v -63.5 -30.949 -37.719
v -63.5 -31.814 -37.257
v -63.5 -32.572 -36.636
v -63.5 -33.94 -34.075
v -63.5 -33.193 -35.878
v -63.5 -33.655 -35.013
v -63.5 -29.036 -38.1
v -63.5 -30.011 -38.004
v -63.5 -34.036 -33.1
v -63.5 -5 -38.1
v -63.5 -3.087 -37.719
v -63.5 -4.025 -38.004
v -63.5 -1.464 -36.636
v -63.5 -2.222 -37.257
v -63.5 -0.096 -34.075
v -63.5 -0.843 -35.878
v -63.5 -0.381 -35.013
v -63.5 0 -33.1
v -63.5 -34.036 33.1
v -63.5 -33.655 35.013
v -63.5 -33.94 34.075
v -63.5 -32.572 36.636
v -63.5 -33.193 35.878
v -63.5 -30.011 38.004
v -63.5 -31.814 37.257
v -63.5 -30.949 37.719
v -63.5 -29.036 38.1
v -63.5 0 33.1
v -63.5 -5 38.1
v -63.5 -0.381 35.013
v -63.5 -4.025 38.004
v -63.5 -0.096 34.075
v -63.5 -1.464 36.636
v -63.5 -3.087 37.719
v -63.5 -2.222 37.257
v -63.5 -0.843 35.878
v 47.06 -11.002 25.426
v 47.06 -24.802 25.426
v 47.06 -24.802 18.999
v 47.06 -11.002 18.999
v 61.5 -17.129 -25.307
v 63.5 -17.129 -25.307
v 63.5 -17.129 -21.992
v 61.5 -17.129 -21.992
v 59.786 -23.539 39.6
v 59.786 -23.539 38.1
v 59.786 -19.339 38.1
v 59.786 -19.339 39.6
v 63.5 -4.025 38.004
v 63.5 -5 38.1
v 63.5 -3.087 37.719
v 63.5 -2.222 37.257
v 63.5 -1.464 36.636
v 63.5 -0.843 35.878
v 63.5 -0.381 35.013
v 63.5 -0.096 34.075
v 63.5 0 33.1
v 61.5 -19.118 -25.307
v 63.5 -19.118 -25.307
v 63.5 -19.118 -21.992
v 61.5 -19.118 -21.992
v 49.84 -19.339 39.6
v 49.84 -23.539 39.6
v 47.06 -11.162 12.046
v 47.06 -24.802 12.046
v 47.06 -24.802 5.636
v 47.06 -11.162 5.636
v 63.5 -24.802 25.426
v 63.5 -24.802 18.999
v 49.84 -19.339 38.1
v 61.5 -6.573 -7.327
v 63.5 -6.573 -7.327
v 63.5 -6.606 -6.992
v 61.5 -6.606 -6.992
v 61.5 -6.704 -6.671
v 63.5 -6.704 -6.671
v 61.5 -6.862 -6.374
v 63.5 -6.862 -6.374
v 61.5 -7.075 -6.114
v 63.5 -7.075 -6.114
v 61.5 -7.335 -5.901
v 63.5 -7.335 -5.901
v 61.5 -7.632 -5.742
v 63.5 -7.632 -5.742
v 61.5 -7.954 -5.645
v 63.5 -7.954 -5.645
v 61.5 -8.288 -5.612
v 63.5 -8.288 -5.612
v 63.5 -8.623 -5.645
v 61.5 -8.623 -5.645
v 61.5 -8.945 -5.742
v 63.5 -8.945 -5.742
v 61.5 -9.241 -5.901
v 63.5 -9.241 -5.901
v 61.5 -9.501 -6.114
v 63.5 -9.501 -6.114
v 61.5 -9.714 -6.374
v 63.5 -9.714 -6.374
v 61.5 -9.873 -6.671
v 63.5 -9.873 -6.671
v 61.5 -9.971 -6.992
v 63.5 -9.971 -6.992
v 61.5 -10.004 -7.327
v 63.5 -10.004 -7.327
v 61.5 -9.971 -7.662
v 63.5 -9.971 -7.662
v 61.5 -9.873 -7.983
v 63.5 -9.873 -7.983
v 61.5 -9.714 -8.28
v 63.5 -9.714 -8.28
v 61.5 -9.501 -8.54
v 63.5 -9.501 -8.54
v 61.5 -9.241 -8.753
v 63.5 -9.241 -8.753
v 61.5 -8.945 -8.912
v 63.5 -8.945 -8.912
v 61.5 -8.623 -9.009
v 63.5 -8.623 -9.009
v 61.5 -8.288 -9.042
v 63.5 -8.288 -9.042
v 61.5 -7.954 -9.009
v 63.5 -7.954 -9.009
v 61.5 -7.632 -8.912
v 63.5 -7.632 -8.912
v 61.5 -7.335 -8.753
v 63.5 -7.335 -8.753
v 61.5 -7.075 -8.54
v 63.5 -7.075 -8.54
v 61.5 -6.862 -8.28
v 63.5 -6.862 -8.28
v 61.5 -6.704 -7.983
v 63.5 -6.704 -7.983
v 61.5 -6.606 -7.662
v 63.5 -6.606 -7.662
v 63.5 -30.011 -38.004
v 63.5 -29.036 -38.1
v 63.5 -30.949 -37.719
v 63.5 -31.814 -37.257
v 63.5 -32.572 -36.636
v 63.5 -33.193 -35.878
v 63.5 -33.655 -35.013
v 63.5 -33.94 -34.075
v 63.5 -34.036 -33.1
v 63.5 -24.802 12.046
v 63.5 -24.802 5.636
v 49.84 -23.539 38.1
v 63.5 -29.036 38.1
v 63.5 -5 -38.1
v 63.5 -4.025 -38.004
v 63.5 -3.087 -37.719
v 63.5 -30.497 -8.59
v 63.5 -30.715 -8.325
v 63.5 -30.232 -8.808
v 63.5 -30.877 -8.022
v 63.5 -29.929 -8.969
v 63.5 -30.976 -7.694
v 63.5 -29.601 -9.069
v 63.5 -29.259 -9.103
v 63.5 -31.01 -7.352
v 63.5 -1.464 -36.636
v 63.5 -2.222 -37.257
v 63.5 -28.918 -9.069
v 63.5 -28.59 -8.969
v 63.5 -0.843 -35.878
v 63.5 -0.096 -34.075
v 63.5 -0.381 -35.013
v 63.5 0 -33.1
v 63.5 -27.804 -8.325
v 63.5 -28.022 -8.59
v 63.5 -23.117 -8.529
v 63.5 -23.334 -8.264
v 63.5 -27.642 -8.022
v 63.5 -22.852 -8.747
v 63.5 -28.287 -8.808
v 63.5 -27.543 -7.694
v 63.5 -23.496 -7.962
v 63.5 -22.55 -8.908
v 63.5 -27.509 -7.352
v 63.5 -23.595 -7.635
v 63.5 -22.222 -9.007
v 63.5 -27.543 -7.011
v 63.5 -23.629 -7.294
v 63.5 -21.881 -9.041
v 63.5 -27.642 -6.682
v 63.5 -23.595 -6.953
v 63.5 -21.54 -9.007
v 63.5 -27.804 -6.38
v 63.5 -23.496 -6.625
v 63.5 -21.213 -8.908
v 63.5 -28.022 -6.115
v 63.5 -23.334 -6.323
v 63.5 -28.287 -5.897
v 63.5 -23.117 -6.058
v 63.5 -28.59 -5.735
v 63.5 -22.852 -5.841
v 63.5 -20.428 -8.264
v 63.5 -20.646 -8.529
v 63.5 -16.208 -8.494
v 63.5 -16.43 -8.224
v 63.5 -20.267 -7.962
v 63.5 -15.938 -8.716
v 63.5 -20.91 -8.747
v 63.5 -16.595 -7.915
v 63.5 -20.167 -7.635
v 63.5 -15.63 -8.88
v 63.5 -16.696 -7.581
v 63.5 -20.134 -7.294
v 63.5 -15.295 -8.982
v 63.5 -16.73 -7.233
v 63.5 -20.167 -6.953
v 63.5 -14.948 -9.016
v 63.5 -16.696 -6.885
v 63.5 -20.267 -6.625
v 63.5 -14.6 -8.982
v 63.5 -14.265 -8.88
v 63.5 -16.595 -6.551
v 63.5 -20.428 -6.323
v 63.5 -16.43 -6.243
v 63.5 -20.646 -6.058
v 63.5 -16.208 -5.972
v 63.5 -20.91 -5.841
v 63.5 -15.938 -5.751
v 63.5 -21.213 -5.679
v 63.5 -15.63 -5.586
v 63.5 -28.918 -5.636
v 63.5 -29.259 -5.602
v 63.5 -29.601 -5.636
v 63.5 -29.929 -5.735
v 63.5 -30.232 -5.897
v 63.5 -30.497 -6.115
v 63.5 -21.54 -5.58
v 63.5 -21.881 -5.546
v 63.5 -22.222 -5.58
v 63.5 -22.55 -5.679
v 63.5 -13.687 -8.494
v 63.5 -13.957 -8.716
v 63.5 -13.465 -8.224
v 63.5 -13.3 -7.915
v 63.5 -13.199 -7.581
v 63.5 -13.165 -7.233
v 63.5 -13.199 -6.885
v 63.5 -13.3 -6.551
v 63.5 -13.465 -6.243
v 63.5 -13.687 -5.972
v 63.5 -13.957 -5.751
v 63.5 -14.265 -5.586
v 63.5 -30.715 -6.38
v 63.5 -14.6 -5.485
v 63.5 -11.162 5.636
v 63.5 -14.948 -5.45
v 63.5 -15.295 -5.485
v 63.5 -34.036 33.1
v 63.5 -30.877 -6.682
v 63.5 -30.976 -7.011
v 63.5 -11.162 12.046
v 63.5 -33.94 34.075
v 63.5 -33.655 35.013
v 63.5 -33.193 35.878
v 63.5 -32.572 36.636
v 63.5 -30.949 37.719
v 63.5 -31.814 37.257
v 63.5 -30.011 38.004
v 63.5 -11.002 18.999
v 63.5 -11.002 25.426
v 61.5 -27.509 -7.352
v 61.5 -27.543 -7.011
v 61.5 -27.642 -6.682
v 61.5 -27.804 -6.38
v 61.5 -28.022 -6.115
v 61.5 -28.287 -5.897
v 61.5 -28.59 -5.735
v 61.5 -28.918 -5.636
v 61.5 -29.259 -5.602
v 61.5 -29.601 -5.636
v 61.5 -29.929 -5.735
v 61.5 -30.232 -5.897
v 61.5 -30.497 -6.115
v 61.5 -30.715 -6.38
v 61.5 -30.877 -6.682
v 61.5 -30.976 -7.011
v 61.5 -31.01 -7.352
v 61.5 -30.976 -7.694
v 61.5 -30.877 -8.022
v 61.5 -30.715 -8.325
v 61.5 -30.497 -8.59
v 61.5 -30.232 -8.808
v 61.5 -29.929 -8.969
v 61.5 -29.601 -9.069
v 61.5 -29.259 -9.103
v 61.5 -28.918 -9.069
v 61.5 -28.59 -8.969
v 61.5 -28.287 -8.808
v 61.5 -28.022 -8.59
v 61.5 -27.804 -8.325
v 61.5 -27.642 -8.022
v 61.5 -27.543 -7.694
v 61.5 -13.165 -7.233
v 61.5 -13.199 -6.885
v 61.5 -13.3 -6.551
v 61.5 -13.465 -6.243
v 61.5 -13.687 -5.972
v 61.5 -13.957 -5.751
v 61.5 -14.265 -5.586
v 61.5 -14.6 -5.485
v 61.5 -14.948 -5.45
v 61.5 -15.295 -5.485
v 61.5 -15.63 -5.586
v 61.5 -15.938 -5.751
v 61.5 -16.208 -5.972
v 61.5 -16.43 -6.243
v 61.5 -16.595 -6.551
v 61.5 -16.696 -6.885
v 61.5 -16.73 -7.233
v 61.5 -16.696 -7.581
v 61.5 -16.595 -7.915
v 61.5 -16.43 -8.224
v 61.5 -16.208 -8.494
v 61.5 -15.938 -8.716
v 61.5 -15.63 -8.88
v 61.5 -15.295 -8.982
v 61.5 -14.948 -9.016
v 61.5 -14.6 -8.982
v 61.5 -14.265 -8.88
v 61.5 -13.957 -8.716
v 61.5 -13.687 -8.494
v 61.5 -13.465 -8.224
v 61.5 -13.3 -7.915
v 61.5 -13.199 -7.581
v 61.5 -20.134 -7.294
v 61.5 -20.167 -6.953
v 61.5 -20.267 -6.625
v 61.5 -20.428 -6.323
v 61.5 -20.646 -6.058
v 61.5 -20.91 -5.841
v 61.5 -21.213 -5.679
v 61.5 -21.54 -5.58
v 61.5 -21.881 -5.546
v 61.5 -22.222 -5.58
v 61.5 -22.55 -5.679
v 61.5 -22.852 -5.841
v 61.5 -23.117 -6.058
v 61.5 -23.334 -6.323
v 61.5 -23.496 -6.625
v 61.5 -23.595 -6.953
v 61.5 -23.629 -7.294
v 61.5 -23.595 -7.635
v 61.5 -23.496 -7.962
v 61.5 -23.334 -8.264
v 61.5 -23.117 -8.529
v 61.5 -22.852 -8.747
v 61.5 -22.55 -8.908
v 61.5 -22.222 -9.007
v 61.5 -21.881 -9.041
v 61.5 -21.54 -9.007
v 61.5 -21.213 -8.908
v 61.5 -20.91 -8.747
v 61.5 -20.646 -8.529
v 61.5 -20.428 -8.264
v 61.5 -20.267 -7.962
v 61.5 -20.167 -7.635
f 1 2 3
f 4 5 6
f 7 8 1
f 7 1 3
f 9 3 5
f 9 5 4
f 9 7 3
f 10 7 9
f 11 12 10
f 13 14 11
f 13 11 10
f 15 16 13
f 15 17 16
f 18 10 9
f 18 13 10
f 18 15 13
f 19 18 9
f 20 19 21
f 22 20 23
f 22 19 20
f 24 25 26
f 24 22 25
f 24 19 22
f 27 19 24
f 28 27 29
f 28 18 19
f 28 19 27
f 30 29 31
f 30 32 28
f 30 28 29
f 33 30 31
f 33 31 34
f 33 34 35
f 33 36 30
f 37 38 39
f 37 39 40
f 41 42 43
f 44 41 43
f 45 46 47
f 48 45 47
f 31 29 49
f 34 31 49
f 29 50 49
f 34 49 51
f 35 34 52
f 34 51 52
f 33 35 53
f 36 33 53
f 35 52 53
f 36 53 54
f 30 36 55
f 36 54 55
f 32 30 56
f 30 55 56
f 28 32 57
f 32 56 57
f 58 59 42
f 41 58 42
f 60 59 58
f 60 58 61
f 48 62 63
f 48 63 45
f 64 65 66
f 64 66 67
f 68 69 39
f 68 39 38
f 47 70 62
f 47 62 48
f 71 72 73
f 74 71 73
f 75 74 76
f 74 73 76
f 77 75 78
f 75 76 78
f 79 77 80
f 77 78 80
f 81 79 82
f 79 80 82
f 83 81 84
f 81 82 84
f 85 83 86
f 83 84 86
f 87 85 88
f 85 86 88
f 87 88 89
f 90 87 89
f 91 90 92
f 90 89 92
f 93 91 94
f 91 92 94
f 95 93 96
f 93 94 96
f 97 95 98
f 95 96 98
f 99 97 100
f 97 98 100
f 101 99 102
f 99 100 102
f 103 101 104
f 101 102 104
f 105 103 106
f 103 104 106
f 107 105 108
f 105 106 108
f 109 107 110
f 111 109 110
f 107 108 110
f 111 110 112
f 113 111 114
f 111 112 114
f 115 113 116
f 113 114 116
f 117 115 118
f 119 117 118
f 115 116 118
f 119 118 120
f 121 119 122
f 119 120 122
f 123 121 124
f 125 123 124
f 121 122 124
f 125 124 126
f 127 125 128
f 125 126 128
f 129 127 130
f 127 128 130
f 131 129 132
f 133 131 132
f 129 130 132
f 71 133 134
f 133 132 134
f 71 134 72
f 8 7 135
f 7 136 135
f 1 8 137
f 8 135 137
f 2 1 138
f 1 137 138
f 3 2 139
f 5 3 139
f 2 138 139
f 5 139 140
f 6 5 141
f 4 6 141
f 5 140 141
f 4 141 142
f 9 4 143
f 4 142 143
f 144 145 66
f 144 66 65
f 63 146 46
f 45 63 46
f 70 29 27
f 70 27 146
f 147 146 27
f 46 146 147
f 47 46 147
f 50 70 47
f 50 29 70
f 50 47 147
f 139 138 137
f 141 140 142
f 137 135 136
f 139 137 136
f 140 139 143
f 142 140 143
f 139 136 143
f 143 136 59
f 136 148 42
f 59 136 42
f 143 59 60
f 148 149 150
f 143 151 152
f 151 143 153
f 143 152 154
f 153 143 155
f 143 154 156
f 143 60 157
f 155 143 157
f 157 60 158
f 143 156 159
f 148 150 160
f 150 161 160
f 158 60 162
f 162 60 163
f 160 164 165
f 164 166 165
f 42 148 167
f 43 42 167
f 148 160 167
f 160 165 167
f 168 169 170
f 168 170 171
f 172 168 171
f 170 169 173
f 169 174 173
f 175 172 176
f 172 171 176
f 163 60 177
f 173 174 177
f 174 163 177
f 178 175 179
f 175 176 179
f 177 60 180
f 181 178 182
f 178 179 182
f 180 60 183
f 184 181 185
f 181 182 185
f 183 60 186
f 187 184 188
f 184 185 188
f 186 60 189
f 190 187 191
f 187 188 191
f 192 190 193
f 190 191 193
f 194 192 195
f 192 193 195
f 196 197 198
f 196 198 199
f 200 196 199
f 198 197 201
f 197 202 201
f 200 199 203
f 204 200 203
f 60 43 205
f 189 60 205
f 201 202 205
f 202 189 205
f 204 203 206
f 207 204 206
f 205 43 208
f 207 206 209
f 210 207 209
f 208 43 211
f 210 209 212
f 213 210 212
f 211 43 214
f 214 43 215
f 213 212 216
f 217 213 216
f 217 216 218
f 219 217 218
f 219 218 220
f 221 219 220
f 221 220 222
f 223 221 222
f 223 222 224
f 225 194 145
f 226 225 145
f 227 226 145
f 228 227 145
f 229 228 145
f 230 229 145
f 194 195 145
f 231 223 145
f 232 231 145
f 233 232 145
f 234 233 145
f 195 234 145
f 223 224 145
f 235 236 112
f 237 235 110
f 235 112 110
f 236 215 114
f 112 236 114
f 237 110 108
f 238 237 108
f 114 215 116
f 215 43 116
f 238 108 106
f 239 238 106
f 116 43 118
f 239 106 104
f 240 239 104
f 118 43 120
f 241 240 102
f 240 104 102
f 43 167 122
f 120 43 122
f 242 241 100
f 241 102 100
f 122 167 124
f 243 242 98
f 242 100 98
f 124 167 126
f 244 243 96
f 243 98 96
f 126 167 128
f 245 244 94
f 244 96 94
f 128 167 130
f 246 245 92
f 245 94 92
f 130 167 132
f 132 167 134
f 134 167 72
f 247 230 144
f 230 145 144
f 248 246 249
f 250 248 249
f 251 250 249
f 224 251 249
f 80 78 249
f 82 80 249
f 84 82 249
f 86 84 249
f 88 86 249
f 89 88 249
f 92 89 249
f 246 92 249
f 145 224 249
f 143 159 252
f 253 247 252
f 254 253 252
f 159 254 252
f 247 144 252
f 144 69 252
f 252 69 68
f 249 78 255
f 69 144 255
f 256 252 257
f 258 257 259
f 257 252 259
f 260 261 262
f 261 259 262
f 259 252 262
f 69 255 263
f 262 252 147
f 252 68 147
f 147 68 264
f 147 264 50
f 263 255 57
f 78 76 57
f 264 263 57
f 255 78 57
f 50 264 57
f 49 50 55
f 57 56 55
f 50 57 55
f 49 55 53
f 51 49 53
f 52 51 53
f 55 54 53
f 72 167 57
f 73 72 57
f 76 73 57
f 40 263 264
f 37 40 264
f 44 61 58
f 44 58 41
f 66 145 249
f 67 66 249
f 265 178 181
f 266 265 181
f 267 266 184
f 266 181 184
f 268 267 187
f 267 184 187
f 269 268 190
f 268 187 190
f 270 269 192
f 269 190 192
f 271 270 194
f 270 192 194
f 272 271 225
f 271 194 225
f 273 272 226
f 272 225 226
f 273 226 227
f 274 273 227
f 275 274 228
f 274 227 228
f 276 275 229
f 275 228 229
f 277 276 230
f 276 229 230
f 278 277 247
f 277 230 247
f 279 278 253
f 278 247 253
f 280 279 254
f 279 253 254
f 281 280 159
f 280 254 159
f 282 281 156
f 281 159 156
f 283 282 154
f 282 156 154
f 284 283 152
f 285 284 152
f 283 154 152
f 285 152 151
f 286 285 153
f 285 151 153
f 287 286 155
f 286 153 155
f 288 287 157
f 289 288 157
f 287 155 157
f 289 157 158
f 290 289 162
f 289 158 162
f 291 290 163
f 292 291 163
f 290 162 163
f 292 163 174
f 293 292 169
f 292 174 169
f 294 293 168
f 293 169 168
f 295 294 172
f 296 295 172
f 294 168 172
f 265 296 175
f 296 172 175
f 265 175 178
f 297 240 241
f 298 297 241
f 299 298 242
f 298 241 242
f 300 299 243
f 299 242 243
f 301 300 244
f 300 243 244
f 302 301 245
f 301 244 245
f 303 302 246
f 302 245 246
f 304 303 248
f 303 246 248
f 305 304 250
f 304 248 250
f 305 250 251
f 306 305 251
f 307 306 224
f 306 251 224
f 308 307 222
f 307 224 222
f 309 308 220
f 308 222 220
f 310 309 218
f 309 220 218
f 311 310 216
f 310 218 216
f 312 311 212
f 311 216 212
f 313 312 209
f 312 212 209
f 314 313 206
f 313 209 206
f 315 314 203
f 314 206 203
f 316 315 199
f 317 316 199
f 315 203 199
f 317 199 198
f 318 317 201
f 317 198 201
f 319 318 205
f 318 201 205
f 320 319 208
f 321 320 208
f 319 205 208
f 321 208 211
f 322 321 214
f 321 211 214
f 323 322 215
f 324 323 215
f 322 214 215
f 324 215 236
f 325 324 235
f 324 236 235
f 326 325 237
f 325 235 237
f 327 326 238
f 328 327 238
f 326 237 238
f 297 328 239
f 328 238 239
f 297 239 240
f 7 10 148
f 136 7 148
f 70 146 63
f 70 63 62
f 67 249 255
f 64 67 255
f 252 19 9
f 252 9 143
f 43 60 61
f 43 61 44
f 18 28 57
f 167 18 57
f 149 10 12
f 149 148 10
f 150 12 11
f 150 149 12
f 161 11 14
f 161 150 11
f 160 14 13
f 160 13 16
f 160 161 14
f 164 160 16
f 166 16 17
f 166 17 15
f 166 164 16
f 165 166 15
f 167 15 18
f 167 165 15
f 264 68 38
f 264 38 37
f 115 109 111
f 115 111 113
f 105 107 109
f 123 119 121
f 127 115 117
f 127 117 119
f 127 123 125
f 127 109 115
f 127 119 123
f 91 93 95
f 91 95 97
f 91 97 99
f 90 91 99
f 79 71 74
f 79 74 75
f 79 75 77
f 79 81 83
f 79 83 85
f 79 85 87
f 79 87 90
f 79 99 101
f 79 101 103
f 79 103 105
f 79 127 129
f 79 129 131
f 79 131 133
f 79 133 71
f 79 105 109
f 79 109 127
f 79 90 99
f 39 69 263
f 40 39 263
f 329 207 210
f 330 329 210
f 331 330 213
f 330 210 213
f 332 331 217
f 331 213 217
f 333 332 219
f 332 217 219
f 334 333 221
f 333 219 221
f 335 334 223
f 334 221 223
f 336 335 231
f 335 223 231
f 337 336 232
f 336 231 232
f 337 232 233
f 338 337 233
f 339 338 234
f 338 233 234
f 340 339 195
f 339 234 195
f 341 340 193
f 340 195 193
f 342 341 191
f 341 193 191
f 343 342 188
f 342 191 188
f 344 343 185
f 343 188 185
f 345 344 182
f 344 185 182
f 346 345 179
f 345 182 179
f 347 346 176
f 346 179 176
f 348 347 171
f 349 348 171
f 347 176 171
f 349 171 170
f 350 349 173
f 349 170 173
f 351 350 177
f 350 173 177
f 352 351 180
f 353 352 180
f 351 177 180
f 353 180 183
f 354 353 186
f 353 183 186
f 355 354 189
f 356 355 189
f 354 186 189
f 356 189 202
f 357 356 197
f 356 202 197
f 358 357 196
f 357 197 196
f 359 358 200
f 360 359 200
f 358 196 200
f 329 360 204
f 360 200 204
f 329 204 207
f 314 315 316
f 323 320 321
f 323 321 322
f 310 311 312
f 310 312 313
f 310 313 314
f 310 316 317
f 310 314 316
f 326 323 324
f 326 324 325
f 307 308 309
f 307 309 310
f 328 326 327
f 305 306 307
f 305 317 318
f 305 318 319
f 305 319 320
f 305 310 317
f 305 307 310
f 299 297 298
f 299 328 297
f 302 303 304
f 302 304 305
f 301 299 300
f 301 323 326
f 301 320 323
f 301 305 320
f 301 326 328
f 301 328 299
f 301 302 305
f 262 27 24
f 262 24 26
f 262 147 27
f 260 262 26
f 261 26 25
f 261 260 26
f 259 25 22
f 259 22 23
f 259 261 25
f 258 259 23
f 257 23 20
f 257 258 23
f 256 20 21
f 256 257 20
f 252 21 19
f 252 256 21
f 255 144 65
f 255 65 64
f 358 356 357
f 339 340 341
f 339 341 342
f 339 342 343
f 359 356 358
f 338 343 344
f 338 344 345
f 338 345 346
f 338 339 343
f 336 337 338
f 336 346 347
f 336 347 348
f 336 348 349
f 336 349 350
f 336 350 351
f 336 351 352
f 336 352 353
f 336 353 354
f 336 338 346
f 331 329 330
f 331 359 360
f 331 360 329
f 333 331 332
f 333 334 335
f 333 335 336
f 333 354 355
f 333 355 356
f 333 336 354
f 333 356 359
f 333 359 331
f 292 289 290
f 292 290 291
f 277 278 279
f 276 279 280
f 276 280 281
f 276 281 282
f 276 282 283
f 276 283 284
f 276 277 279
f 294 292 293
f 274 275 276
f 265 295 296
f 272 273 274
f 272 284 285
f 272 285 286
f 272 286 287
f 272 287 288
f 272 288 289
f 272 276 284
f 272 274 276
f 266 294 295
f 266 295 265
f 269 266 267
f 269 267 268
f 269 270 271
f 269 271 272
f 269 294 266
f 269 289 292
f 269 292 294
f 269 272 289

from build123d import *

# Parameters (mm, degrees)
F0_W      = 127
F0_H      = 76.2
F1_DEPTH  = 34.036
F2_R      = 5
F3_W      = 13.8
F3_H      = 6.427399
F4_DEPTH  = 16.44
F5_W      = 13.640474
F5_H      = 6.40964
F6_DEPTH  = 16.44
F7_R      = 1.750354
F8_DEPTH  = 2
F9_R      = 1.747334
F10_DEPTH = 2
F11_R     = 1.782864
F12_DEPTH = 2
F13_R     = 1.715202
F14_DEPTH = 2
F15_W     = 1.989198
F15_H     = 3.315331
F16_DEPTH = 2
F17_W     = 9.945992
F17_H     = 4.199421
F18_DEPTH = 1.5


with BuildPart() as f1:
    # F0 (on Front) → F1 (new body)
    with BuildSketch(Plane.XZ):
        Rectangle(F0_W, F0_H)
    extrude(amount=F1_DEPTH)

    # F2
    f2_edges = [f1.edges().sort_by_distance(p)[0] for p in [
        (0, -34.036, 38.1),
        (0, 0, 38.1),
        (0, -34.036, -38.1),
        (0, 0, -38.1),
    ]]
    fillet(f2_edges, radius=F2_R)

    # F3 (on face) → F4 (cut)
    with BuildSketch(Plane.YZ.offset(63.5)):
        with Locations((-17.902091, 22.212722)):
            Rectangle(F3_W, F3_H)
    extrude(amount=-F4_DEPTH, mode=Mode.SUBTRACT)

    # F5 (on face) → F6 (cut)
    with BuildSketch(Plane.YZ.offset(63.5)):
        with Locations((-17.981854, 8.840884)):
            Rectangle(F5_W, F5_H)
    extrude(amount=-F6_DEPTH, mode=Mode.SUBTRACT)

    # F7 (on face) → F8 (cut)
    with BuildSketch(Plane.YZ.offset(63.5)):
        with Locations((-29.259426, -7.352235)):
            Circle(F7_R)
    extrude(amount=-F8_DEPTH, mode=Mode.SUBTRACT)

    # F9 (on face) → F10 (cut)
    with BuildSketch(Plane.YZ.offset(63.5)):
        with Locations((-21.881189, -7.29373)):
            Circle(F9_R)
    extrude(amount=-F10_DEPTH, mode=Mode.SUBTRACT)

    # F11 (on face) → F12 (cut)
    with BuildSketch(Plane.YZ.offset(63.5)):
        with Locations((-14.947511, -7.233127)):
            Circle(F11_R)
    extrude(amount=-F12_DEPTH, mode=Mode.SUBTRACT)

    # F13 (on face) → F14 (cut)
    with BuildSketch(Plane.YZ.offset(63.5)):
        with Locations((-8.288329, -7.326883)):
            Circle(F13_R)
    extrude(amount=-F14_DEPTH, mode=Mode.SUBTRACT)

    # F15 (on face) → F16 (cut)
    with BuildSketch(Plane.YZ.offset(63.5)):
        with Locations((-18.123812, -23.649363)):
            Rectangle(F15_W, F15_H)
    extrude(amount=-F16_DEPTH, mode=Mode.SUBTRACT)

    # F17 (on face) → F18 (join)
    with BuildSketch(Plane.XY.offset(38.1)):
        with Locations((54.813484, -21.439144)):
            Rectangle(F17_W, F17_H)
    extrude(amount=F18_DEPTH)


solid = f1.part
